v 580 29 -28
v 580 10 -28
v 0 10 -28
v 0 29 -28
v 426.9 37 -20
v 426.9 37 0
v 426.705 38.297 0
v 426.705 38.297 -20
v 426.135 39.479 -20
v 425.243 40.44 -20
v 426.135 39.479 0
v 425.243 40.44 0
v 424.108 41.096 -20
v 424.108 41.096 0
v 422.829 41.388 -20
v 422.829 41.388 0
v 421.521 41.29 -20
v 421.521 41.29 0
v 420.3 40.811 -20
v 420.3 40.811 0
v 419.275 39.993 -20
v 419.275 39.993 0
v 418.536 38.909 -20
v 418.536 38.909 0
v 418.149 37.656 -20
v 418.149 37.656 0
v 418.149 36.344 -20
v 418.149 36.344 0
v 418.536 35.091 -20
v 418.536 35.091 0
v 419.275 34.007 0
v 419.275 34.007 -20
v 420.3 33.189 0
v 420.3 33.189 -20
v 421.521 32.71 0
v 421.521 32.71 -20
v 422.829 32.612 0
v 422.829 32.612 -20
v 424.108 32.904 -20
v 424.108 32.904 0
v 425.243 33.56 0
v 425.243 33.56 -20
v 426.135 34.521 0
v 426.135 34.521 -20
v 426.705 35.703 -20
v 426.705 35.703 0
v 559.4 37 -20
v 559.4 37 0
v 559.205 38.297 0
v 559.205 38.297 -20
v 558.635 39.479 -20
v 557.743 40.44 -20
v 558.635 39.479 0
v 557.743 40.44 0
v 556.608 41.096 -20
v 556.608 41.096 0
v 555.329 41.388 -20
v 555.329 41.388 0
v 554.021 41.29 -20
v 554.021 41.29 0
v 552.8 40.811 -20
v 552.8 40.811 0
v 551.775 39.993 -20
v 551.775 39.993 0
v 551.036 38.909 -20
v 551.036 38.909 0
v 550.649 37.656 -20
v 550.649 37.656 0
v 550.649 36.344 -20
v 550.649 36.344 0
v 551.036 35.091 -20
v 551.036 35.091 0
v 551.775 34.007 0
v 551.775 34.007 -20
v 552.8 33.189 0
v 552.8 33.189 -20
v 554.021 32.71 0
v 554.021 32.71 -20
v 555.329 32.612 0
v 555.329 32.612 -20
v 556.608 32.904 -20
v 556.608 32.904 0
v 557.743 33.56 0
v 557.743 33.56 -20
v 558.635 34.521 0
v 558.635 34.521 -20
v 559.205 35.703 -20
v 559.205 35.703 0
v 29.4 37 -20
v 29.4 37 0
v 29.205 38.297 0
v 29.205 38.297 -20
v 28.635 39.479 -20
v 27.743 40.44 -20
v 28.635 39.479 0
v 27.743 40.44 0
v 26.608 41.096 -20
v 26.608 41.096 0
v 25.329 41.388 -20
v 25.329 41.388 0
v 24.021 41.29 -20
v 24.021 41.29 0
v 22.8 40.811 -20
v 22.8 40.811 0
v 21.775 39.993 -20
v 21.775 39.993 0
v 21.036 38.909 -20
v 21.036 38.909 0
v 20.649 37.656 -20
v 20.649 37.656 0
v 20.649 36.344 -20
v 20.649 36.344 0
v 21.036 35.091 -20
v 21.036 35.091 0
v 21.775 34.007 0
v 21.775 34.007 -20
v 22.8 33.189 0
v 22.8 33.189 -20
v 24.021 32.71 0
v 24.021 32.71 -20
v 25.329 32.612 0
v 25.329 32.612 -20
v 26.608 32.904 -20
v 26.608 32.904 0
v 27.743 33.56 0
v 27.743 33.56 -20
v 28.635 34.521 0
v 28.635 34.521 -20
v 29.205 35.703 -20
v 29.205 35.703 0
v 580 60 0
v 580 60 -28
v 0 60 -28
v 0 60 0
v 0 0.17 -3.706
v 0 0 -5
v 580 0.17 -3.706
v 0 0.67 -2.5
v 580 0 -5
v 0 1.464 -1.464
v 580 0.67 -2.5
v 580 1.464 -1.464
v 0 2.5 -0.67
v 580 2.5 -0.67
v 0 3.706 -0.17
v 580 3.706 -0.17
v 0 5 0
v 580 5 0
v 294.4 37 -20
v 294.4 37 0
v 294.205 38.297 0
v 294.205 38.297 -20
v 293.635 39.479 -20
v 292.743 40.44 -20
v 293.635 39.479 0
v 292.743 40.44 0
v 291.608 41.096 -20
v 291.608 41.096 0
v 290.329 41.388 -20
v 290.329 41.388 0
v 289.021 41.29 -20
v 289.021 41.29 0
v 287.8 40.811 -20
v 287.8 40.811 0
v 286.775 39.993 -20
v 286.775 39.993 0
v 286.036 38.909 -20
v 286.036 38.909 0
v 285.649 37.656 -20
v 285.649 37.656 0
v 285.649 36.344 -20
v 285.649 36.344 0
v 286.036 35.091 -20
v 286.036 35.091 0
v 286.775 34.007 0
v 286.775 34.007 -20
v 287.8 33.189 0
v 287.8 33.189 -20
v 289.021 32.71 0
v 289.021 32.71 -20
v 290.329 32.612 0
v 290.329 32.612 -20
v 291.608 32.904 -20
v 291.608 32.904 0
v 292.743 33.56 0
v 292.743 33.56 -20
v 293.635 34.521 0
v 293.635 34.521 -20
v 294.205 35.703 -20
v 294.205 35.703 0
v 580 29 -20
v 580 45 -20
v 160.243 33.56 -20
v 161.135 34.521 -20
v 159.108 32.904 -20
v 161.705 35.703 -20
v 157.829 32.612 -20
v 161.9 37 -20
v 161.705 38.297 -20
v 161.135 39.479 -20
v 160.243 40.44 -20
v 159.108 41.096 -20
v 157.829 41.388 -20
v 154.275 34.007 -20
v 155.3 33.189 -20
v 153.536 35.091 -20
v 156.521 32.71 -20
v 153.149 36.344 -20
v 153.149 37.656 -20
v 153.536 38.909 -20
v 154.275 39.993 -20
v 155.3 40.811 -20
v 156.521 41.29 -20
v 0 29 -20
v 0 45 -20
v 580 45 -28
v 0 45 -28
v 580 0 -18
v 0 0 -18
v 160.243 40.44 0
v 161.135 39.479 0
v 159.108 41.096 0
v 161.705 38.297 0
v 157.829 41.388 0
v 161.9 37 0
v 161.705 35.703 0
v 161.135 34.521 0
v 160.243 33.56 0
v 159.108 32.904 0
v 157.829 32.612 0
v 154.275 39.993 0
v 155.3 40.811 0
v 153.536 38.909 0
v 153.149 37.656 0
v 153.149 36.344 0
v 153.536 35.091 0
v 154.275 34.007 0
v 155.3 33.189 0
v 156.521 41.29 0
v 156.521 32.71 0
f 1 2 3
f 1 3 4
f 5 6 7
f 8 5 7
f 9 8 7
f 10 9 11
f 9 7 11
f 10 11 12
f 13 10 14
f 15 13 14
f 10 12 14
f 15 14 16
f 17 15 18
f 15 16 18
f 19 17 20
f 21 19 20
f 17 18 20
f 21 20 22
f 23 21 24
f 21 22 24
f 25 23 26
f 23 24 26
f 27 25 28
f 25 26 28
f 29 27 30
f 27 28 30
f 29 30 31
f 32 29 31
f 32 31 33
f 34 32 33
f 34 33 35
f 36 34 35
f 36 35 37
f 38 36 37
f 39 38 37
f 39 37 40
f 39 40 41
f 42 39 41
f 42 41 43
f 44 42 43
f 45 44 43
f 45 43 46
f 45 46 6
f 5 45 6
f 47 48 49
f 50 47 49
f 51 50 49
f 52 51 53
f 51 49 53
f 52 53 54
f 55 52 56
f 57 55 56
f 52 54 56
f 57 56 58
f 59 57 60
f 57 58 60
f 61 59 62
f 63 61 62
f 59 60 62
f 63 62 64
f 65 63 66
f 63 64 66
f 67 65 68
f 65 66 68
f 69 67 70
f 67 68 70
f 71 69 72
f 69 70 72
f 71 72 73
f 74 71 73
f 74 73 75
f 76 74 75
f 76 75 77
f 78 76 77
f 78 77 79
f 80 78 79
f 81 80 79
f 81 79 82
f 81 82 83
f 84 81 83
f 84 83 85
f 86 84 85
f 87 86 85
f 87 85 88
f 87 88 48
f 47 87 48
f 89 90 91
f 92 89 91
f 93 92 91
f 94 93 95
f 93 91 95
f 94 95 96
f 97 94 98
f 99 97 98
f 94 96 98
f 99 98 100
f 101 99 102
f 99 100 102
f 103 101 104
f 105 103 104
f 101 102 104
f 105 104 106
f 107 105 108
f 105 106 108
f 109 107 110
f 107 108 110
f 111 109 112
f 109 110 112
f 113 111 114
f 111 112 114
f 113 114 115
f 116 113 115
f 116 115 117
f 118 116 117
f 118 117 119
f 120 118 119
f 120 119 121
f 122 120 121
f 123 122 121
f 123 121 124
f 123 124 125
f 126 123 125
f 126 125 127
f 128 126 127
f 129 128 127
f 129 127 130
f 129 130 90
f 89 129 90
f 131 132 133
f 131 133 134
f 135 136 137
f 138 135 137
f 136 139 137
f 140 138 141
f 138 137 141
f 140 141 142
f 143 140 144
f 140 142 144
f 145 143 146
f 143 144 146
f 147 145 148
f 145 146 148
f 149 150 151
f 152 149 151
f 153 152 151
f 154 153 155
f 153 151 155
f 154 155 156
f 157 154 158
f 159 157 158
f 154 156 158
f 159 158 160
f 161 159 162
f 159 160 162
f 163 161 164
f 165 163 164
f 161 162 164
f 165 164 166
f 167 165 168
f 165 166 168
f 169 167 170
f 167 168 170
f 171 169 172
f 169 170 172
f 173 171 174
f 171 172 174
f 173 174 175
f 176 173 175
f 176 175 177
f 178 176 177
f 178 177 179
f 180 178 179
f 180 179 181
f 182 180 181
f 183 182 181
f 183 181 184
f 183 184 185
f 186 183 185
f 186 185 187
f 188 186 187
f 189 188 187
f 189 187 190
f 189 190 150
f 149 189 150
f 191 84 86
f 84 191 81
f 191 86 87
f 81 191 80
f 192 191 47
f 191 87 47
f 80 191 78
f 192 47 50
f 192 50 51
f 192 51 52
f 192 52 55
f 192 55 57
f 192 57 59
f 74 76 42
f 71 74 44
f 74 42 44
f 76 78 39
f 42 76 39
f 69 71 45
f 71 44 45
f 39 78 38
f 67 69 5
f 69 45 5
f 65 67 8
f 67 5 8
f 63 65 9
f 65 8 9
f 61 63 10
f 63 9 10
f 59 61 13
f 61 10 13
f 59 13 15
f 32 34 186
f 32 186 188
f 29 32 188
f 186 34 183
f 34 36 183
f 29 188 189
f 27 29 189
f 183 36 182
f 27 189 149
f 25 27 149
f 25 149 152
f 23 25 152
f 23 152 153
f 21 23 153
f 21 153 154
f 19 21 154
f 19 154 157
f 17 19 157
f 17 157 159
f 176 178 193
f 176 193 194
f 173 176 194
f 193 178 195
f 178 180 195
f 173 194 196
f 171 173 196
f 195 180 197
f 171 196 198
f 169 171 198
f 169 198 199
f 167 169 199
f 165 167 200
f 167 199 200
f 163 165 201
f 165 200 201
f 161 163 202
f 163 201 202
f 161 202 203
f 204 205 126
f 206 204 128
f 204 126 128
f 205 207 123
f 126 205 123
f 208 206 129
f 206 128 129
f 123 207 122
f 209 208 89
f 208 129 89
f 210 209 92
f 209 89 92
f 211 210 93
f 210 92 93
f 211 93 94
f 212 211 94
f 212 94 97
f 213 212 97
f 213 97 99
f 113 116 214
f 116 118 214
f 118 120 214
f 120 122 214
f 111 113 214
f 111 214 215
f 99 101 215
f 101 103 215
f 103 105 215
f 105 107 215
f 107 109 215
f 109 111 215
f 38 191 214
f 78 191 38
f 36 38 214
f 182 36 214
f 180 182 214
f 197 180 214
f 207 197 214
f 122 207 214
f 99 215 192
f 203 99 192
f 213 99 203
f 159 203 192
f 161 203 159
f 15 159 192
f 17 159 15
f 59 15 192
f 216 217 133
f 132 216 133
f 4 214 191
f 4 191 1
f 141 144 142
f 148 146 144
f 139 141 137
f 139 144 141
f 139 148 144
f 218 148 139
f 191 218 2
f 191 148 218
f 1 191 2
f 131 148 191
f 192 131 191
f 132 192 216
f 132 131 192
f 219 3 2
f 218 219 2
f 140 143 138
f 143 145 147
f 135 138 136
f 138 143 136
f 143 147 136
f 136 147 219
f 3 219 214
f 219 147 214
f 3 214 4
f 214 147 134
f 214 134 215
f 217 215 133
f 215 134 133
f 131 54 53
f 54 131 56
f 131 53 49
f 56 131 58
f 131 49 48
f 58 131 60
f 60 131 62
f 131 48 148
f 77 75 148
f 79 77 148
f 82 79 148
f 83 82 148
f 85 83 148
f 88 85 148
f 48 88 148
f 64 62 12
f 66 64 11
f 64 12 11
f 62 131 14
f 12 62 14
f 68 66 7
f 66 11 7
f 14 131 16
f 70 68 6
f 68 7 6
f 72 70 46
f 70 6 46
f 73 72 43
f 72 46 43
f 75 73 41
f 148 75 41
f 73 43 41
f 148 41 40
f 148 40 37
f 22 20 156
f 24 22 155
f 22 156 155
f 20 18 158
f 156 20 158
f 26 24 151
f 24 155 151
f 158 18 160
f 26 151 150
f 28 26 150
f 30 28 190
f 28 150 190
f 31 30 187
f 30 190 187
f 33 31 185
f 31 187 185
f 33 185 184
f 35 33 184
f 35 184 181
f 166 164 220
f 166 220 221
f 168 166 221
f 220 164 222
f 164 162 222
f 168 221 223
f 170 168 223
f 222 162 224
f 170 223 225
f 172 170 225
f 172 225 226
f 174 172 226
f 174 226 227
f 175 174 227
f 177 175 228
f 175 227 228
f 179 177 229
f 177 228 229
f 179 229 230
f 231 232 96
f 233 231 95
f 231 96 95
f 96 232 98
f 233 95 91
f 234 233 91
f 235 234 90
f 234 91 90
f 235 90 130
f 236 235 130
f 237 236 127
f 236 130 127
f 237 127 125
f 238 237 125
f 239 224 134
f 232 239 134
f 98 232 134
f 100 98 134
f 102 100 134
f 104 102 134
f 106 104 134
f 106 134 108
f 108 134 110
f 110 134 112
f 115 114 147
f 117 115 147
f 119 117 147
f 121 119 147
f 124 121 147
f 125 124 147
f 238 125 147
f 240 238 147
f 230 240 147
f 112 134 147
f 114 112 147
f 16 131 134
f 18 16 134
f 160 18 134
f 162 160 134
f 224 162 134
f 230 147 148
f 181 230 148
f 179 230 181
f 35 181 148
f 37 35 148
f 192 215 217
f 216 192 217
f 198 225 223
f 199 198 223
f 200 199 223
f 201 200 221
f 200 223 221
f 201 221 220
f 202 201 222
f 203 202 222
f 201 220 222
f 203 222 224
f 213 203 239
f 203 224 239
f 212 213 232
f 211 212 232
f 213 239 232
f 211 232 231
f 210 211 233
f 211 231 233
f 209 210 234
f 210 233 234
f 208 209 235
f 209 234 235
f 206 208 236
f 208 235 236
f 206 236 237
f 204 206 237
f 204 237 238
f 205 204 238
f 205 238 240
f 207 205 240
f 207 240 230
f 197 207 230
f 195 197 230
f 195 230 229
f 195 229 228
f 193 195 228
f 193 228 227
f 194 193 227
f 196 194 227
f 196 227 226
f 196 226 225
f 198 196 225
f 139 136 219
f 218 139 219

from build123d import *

# Parameters (mm, degrees)
SKETCH_1_W       = 20
SKETCH_1_H       = 16
SKETCH_1_W_2     = 28
SKETCH_1_H_2     = 29
EXTRUDE_1_DEPTH  = 580
CHAMFER_1_SIZE   = 10
M10X1_25_1_D     = 8.8
M10X1_25_1_DEPTH = 59
M10X1_25_1_TIP   = 2.643786724
FILLET_1_R       = 5


with BuildPart() as part:
    # 草圖1 → 填料-伸長1 (new body)
    with BuildSketch(Plane(origin=(0, 0, 0), x_dir=(0, 0, -1), z_dir=(1, 0, 0))):
        Polygon((0, 60), (0, 45), (20, 45), (28, 45), (28, 60), align=None)
        with Locations((10, 37)):
            Rectangle(SKETCH_1_W, SKETCH_1_H)
        with Locations((14, 14.5)):
            Rectangle(SKETCH_1_W_2, SKETCH_1_H_2)
    extrude(amount=EXTRUDE_1_DEPTH)

    # 導角1
    chamfer_1_edges = [part.edges().sort_by_distance(p)[0] for p in [
        (290, 0, -28),
    ]]
    chamfer(chamfer_1_edges, length=CHAMFER_1_SIZE)

    # M10x1.25 螺紋孔1
    with Locations(Plane(origin=(0, 0, -20), x_dir=(-1, 0, 0), z_dir=(0, 0, -1))):
        with Locations((-555, 37), (-422.5, 37), (-290, 37), (-157.5, 37), (-25, 37)):
            Hole(M10X1_25_1_D / 2, depth=M10X1_25_1_DEPTH)
            with Locations((0, 0, -(M10X1_25_1_DEPTH + M10X1_25_1_TIP / 2))):  # 118° drill point
                Cone(0, M10X1_25_1_D / 2, M10X1_25_1_TIP, mode=Mode.SUBTRACT)

    # 圓角1
    fillet_1_edges = [part.edges().sort_by_distance(p)[0] for p in [
        (290, 0, 0),
    ]]
    fillet(fillet_1_edges, radius=FILLET_1_R)


solid = part.part
